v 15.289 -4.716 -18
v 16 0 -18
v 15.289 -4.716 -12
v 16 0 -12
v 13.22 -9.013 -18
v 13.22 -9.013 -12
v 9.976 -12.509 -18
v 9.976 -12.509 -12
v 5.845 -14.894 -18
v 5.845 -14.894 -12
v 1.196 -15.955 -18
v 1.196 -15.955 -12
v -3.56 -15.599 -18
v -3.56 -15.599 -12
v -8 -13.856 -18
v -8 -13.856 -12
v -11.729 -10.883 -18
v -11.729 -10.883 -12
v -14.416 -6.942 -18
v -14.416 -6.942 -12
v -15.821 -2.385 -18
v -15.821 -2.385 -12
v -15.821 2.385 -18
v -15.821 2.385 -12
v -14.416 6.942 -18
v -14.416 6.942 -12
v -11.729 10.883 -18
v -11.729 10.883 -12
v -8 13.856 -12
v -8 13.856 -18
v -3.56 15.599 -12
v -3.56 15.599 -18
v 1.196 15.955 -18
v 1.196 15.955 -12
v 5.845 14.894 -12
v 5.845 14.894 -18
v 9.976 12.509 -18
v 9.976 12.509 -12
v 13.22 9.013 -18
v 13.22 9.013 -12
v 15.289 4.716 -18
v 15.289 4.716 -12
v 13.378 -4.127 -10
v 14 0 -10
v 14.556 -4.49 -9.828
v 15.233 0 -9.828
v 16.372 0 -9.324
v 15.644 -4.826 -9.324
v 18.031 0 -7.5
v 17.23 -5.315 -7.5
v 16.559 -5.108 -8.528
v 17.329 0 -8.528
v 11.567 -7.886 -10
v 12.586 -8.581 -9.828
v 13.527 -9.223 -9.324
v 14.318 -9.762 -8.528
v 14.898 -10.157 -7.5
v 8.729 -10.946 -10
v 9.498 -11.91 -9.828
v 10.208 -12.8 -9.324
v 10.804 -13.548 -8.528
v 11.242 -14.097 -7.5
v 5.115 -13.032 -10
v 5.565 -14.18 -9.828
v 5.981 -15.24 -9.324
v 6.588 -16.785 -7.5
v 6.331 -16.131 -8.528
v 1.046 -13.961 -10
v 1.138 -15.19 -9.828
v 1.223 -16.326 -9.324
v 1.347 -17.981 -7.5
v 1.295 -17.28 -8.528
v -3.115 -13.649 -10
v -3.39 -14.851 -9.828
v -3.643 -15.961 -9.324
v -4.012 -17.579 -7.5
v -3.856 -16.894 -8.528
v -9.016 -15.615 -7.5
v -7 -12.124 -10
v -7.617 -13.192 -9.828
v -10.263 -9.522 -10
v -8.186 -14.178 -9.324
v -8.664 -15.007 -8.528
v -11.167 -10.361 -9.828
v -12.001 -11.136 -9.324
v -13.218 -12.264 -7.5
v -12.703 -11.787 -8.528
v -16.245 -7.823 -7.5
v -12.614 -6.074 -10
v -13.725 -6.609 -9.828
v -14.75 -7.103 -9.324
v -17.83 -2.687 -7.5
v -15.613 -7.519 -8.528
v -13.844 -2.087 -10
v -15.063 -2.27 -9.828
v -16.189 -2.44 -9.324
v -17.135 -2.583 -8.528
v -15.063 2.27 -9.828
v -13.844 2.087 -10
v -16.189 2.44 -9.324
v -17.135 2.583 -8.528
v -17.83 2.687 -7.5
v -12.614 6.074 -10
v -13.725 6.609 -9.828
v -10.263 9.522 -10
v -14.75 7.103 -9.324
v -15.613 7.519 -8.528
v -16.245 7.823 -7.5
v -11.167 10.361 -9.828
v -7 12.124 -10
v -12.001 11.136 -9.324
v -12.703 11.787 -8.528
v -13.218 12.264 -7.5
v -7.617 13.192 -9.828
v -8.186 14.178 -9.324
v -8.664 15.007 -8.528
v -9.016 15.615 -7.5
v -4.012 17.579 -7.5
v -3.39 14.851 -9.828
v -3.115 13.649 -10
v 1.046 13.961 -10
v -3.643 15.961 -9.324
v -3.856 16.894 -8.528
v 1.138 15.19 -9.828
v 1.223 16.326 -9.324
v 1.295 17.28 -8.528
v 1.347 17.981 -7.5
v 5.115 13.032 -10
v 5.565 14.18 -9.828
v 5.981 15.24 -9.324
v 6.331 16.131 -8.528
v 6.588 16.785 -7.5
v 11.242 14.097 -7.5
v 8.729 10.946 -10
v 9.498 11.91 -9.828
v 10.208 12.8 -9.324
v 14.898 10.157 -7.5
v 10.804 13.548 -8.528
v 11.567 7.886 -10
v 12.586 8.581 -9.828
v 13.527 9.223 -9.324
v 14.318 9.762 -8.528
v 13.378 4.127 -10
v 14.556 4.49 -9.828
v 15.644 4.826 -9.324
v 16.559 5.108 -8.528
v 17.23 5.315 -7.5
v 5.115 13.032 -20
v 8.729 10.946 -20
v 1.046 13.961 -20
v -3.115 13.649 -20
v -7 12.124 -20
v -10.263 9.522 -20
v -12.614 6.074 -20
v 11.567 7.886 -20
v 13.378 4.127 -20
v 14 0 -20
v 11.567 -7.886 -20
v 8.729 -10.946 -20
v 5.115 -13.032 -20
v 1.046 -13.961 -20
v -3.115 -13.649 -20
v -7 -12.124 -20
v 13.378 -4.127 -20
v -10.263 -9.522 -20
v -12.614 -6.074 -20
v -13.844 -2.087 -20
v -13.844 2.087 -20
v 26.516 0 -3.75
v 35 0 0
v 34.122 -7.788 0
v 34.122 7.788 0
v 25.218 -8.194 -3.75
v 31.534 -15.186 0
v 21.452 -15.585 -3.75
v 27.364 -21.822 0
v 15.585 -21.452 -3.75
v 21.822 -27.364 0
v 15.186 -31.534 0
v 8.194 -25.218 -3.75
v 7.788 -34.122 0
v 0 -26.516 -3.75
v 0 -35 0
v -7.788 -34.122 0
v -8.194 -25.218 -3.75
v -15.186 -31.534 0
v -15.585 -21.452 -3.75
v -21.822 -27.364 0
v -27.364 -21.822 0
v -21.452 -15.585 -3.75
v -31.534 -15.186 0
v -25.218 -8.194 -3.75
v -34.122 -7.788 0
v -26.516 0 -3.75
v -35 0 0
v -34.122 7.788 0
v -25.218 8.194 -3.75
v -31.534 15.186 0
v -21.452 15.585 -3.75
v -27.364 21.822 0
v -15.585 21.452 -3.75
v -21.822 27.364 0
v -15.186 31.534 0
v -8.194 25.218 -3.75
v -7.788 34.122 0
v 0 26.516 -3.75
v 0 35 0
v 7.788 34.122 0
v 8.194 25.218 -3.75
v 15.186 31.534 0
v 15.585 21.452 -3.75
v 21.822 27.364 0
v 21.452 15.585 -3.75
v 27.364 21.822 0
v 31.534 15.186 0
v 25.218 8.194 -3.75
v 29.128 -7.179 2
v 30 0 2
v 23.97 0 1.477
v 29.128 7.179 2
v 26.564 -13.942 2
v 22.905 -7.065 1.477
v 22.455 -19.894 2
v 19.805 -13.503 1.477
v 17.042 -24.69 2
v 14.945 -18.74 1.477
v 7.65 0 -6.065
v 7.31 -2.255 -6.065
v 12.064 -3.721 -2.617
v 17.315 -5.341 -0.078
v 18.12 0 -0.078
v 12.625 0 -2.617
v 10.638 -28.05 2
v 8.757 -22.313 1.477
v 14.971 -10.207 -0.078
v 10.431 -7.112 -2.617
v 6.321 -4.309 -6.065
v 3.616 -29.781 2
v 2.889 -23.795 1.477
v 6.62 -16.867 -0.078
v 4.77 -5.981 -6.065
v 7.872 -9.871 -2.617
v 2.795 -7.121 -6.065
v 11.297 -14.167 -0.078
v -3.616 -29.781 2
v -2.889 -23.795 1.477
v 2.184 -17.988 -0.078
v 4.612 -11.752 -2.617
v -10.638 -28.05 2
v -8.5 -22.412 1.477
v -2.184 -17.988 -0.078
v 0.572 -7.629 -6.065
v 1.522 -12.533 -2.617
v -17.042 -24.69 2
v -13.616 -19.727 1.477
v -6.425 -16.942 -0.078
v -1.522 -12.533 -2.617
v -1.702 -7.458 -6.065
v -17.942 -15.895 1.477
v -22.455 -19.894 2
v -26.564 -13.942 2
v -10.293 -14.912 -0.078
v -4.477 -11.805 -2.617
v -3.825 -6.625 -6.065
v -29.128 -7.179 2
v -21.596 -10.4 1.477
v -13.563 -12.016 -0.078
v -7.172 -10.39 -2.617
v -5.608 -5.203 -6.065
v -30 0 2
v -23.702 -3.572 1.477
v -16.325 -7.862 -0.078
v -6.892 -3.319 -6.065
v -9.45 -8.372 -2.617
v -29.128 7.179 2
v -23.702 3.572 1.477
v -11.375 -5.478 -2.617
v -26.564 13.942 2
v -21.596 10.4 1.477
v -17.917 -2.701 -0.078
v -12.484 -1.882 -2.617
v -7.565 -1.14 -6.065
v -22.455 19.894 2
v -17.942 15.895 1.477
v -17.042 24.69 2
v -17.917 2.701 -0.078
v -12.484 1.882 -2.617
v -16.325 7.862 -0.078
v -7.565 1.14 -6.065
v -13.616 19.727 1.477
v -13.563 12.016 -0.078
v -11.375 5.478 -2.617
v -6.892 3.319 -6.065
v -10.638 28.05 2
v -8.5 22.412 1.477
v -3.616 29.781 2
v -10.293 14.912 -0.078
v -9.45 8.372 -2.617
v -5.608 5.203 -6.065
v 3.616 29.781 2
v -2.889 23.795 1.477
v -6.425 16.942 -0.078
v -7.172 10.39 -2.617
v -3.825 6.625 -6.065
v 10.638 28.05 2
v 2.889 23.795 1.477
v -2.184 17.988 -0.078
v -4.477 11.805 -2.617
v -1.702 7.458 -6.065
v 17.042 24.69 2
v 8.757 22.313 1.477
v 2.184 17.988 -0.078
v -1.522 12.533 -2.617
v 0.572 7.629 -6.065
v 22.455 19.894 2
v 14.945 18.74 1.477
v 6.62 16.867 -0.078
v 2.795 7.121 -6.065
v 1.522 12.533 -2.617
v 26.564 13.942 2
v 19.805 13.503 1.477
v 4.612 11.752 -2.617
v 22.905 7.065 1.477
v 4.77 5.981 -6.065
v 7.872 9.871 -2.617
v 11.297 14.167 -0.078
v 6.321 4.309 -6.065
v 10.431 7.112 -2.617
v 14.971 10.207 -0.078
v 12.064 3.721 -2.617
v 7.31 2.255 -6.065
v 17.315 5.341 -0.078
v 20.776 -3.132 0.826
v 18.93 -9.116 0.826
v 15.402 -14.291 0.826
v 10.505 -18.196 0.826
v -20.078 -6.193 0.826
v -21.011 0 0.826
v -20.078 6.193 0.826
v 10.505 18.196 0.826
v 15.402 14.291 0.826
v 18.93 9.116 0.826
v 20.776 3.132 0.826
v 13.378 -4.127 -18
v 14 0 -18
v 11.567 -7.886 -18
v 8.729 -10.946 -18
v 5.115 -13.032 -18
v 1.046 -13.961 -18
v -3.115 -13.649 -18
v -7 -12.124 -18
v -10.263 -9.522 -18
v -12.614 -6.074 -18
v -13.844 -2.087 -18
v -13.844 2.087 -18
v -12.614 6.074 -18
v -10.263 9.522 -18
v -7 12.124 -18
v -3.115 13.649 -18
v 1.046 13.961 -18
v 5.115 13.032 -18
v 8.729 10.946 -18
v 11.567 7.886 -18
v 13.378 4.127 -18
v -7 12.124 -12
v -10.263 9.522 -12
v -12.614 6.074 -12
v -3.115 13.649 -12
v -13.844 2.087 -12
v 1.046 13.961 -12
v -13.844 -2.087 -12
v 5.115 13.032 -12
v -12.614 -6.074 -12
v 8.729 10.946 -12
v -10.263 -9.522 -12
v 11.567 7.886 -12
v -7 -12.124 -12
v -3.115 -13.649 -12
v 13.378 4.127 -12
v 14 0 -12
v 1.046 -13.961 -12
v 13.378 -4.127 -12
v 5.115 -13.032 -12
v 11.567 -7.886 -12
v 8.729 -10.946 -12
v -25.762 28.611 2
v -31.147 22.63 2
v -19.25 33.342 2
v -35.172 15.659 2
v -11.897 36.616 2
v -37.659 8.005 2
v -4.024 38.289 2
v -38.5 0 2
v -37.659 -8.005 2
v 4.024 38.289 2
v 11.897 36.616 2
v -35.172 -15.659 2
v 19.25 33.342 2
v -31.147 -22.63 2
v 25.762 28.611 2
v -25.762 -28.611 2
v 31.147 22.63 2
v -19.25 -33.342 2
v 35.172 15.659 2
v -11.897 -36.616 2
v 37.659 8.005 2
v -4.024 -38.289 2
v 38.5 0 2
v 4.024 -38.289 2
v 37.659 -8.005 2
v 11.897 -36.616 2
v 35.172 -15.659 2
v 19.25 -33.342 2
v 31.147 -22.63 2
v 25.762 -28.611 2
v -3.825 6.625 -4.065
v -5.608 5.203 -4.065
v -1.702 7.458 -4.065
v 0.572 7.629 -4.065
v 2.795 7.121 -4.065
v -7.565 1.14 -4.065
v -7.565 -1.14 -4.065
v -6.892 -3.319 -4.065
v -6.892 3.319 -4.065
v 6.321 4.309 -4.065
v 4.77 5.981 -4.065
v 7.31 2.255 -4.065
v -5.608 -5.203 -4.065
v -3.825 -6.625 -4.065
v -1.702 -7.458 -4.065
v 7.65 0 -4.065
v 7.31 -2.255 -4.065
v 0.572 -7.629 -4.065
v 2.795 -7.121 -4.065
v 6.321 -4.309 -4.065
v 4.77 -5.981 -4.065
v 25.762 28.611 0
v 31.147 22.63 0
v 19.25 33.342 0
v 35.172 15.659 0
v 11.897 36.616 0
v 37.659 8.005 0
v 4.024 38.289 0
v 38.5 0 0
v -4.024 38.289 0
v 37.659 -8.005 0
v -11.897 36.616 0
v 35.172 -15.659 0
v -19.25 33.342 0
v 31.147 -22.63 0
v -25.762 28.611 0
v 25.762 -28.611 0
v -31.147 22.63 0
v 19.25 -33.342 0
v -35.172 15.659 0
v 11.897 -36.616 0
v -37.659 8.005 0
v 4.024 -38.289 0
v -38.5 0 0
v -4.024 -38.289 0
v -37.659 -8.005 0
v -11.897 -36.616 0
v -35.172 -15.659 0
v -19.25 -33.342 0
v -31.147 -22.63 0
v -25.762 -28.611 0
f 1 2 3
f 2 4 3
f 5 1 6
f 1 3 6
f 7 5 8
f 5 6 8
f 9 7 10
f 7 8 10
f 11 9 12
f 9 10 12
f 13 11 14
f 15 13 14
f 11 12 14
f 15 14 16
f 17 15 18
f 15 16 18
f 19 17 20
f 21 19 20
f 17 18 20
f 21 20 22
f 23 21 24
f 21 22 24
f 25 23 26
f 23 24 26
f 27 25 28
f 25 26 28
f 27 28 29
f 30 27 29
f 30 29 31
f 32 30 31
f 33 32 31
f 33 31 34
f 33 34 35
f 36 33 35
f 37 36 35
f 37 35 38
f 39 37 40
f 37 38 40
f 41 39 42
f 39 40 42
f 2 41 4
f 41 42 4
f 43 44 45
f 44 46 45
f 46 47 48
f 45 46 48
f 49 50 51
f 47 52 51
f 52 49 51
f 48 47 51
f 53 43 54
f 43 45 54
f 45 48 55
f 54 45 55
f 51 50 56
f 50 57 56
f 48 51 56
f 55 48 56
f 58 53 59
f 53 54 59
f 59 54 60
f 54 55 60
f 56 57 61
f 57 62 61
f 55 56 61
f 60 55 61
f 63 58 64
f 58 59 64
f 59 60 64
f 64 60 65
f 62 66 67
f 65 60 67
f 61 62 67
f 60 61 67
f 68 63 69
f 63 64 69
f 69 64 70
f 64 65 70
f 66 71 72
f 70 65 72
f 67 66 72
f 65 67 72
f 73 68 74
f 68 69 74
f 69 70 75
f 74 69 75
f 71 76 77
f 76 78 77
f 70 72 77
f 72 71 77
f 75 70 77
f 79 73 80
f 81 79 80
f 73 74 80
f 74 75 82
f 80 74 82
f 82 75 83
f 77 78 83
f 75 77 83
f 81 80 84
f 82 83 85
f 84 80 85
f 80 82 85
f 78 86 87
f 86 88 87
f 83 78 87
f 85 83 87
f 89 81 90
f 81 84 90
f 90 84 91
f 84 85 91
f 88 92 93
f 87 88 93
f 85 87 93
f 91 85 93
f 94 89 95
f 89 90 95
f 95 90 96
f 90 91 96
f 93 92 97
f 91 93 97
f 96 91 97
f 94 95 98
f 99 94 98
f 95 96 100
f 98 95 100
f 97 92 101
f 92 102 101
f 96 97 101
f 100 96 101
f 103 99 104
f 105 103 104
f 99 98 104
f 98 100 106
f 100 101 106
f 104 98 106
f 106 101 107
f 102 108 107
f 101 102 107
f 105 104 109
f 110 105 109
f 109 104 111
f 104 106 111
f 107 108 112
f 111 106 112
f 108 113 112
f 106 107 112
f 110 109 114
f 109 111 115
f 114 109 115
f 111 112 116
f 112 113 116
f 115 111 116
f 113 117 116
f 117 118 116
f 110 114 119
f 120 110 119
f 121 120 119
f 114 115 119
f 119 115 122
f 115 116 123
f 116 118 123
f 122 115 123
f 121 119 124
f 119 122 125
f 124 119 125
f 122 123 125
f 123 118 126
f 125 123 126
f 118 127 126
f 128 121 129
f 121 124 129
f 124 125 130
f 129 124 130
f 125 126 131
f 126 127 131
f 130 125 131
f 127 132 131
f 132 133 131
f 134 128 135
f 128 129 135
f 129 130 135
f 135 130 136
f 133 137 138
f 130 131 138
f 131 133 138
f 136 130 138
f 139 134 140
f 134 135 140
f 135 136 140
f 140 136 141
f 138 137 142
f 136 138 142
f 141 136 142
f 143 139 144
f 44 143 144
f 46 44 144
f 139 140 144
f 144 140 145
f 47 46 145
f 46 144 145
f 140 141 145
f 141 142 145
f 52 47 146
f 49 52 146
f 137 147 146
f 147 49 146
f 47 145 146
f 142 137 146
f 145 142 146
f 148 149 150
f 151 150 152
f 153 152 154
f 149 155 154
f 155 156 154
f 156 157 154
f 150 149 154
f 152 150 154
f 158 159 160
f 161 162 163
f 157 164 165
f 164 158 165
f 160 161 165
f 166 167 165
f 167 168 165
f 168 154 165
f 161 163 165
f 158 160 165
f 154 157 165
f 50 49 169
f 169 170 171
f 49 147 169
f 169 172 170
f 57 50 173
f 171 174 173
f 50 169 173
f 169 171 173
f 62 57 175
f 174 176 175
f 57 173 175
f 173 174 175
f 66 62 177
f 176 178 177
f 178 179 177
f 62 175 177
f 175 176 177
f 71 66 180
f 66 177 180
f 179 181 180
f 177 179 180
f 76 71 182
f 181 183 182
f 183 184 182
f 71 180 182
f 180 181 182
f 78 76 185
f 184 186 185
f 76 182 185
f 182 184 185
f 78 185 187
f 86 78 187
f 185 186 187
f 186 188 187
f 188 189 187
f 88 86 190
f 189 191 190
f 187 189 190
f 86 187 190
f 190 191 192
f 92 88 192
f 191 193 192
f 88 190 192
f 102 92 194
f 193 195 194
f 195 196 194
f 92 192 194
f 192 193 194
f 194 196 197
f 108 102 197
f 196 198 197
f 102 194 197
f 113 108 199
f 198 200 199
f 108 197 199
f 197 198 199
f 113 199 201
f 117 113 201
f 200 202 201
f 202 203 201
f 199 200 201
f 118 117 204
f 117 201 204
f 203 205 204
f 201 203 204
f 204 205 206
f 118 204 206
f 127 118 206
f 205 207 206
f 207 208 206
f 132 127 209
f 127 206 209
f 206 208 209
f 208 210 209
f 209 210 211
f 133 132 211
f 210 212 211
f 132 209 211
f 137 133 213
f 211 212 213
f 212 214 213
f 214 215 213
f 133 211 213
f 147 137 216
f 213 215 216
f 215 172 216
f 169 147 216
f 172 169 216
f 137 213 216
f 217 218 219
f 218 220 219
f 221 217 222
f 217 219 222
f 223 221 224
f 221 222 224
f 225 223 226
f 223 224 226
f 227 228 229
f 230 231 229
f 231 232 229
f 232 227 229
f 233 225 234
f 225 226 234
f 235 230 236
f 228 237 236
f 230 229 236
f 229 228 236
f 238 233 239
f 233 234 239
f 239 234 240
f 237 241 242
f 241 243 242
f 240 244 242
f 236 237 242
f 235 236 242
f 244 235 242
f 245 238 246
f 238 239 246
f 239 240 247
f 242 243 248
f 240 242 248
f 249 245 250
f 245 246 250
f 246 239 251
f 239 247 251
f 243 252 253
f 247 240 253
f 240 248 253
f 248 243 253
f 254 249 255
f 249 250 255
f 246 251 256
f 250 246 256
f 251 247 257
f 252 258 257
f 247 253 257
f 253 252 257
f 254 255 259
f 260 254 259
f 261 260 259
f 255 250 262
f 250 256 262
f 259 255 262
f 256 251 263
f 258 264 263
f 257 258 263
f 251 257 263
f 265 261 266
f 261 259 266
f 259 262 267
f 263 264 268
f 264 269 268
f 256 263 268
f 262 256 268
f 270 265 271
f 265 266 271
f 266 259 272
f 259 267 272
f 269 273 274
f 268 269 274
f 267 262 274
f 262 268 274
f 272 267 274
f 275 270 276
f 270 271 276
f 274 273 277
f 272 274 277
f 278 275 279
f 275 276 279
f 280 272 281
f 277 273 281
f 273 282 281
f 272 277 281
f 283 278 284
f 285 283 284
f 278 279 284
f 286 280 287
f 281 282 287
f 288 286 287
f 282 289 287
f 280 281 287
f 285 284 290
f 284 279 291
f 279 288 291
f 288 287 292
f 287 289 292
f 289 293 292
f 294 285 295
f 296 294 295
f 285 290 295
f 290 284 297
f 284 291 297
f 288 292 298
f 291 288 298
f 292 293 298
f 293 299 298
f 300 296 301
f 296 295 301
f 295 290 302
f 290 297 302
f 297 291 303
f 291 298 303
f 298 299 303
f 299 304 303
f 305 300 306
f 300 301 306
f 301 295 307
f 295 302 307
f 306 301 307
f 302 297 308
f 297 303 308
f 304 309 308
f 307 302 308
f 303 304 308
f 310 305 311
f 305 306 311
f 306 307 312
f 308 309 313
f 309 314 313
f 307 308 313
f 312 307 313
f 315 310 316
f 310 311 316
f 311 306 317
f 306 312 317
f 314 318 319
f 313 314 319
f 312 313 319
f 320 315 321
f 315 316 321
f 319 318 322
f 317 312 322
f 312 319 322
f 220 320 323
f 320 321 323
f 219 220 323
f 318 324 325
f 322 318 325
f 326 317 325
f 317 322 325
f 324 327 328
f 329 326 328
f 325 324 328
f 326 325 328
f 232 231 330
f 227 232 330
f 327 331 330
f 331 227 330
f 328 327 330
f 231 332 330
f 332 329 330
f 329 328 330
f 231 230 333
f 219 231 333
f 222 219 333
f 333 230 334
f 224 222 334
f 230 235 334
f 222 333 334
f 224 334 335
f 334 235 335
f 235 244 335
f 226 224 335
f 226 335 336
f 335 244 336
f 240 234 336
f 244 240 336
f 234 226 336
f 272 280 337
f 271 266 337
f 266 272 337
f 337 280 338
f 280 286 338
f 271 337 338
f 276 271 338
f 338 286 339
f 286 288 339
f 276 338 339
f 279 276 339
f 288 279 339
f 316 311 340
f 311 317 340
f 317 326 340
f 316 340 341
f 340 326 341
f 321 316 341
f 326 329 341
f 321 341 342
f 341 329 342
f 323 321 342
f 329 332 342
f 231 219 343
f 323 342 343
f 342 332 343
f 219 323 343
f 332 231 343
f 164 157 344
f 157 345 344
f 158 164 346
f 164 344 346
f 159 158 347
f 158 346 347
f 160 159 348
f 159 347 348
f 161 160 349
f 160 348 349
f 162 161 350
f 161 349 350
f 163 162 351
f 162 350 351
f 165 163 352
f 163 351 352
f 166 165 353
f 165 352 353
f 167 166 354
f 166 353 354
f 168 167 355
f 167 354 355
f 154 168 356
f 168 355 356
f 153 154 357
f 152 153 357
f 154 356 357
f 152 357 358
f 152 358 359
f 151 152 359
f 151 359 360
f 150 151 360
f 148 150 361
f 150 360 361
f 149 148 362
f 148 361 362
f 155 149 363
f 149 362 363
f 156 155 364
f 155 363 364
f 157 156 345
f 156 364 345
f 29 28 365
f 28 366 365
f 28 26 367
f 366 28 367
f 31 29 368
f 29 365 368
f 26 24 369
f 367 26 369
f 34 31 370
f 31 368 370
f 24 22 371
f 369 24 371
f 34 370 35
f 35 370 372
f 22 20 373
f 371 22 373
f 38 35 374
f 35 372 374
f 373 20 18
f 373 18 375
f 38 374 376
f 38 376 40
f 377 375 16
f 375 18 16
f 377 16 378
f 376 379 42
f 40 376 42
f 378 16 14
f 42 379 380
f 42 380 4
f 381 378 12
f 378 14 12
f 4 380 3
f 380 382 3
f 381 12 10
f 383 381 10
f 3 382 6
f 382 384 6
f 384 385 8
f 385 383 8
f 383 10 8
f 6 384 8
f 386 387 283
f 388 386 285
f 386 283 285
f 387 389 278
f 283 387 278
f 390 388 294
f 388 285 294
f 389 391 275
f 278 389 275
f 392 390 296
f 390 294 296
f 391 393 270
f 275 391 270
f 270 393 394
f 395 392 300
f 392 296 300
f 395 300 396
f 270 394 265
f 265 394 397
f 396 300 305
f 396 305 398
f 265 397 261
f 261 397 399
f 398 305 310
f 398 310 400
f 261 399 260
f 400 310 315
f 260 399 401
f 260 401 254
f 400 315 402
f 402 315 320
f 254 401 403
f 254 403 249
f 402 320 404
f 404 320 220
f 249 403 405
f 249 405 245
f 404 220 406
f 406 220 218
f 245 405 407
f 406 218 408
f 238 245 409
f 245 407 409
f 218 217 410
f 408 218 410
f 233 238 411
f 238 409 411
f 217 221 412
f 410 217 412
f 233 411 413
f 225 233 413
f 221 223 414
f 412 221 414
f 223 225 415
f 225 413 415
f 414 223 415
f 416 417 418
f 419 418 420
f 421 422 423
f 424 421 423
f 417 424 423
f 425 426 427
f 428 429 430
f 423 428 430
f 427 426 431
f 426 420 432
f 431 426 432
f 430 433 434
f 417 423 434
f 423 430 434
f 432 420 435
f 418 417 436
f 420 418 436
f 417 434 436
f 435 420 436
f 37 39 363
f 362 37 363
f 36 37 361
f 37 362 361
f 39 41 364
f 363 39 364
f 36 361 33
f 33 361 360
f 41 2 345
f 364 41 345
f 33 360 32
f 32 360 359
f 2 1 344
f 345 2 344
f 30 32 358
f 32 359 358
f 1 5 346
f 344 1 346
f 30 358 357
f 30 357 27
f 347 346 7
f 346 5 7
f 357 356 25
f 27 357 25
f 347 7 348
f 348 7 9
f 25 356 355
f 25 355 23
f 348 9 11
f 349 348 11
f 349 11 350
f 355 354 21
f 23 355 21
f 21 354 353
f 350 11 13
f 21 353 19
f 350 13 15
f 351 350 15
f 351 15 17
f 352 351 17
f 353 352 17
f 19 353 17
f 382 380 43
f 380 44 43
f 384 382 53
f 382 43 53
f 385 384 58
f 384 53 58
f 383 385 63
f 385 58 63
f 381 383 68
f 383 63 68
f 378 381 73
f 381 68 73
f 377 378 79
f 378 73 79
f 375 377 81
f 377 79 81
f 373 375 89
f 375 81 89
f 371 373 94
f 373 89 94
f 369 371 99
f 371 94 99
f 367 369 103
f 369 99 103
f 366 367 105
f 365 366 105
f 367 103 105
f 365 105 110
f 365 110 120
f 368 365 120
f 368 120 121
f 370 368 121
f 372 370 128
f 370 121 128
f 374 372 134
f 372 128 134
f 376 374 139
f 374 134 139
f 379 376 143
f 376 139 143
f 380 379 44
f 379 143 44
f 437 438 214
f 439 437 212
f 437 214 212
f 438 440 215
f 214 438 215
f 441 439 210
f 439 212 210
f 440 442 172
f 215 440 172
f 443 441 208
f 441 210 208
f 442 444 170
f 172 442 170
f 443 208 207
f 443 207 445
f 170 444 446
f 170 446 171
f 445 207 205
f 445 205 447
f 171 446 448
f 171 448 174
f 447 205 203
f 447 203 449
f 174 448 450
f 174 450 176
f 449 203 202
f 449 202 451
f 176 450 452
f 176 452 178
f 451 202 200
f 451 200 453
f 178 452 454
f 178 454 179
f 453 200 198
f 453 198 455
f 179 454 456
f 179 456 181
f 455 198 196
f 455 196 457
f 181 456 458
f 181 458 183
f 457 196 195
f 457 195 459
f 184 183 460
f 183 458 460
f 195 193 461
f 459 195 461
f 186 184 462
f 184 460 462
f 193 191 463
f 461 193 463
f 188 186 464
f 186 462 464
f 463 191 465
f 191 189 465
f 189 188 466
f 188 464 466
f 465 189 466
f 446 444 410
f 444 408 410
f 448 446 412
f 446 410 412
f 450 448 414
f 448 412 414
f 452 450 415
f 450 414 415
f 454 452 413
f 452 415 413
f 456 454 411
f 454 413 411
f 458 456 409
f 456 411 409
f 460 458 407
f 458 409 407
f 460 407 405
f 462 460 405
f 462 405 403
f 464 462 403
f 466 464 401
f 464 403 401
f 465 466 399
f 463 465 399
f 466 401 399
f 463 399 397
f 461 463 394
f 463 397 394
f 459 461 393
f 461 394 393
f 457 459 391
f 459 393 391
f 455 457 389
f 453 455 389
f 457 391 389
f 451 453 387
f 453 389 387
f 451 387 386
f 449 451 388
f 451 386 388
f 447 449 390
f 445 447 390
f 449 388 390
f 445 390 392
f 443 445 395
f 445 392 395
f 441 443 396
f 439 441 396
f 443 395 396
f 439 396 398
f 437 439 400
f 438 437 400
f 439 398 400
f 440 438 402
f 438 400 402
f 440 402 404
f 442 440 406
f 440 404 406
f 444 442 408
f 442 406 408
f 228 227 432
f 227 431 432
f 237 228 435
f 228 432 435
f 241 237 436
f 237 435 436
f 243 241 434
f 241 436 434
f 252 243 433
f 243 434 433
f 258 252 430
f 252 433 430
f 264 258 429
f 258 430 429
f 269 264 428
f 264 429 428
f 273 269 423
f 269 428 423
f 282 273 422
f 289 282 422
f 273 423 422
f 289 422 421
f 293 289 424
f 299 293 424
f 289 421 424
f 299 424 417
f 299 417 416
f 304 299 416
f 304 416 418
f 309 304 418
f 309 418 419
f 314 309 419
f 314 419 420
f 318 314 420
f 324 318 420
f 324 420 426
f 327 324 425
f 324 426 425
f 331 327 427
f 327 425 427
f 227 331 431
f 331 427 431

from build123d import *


with BuildPart() as part:
    # Sketch1 → Revolve1 (revolve)
    with BuildSketch(Plane(origin=(0, 0, 0), x_dir=(0, 0, -1), z_dir=(1, 0, 0)), mode=Mode.PRIVATE) as revolve1_sk:
        with BuildLine():
            Line((20, 0), (20, 14))
            Line((20, 14), (18, 14))
            Line((18, 14), (18, 16))
            Line((18, 16), (12, 16))
            Line((12, 16), (12, 14))
            Line((12, 14), (10, 14))
            ThreePointArc((10, 14), (9.324264635, 16.371708245), (7.5, 18.031128874))
            Line((7.5, 18.031128874), (0, 35))
            Line((0, 35), (0, 38.5))
            Line((0, 38.5), (-2, 38.5))
            Line((-2, 38.5), (-2, 30))
            ThreePointArc((-2, 30), (0.078015449, 18.119640862), (6.065310471, 7.65))
            Line((6.065310471, 7.65), (4.065310471, 7.65))
            Line((4.065310471, 7.65), (4.065310471, 0))
            Line((4.065310471, 0), (20, 0))
        make_face()
    revolve(revolve1_sk.sketch.rotate(Axis((0, 0, -4.065310471), (0, 0, -1)), 90), axis=Axis((0, 0, -4.065310471), (0, 0, -1)))


solid = part.part
